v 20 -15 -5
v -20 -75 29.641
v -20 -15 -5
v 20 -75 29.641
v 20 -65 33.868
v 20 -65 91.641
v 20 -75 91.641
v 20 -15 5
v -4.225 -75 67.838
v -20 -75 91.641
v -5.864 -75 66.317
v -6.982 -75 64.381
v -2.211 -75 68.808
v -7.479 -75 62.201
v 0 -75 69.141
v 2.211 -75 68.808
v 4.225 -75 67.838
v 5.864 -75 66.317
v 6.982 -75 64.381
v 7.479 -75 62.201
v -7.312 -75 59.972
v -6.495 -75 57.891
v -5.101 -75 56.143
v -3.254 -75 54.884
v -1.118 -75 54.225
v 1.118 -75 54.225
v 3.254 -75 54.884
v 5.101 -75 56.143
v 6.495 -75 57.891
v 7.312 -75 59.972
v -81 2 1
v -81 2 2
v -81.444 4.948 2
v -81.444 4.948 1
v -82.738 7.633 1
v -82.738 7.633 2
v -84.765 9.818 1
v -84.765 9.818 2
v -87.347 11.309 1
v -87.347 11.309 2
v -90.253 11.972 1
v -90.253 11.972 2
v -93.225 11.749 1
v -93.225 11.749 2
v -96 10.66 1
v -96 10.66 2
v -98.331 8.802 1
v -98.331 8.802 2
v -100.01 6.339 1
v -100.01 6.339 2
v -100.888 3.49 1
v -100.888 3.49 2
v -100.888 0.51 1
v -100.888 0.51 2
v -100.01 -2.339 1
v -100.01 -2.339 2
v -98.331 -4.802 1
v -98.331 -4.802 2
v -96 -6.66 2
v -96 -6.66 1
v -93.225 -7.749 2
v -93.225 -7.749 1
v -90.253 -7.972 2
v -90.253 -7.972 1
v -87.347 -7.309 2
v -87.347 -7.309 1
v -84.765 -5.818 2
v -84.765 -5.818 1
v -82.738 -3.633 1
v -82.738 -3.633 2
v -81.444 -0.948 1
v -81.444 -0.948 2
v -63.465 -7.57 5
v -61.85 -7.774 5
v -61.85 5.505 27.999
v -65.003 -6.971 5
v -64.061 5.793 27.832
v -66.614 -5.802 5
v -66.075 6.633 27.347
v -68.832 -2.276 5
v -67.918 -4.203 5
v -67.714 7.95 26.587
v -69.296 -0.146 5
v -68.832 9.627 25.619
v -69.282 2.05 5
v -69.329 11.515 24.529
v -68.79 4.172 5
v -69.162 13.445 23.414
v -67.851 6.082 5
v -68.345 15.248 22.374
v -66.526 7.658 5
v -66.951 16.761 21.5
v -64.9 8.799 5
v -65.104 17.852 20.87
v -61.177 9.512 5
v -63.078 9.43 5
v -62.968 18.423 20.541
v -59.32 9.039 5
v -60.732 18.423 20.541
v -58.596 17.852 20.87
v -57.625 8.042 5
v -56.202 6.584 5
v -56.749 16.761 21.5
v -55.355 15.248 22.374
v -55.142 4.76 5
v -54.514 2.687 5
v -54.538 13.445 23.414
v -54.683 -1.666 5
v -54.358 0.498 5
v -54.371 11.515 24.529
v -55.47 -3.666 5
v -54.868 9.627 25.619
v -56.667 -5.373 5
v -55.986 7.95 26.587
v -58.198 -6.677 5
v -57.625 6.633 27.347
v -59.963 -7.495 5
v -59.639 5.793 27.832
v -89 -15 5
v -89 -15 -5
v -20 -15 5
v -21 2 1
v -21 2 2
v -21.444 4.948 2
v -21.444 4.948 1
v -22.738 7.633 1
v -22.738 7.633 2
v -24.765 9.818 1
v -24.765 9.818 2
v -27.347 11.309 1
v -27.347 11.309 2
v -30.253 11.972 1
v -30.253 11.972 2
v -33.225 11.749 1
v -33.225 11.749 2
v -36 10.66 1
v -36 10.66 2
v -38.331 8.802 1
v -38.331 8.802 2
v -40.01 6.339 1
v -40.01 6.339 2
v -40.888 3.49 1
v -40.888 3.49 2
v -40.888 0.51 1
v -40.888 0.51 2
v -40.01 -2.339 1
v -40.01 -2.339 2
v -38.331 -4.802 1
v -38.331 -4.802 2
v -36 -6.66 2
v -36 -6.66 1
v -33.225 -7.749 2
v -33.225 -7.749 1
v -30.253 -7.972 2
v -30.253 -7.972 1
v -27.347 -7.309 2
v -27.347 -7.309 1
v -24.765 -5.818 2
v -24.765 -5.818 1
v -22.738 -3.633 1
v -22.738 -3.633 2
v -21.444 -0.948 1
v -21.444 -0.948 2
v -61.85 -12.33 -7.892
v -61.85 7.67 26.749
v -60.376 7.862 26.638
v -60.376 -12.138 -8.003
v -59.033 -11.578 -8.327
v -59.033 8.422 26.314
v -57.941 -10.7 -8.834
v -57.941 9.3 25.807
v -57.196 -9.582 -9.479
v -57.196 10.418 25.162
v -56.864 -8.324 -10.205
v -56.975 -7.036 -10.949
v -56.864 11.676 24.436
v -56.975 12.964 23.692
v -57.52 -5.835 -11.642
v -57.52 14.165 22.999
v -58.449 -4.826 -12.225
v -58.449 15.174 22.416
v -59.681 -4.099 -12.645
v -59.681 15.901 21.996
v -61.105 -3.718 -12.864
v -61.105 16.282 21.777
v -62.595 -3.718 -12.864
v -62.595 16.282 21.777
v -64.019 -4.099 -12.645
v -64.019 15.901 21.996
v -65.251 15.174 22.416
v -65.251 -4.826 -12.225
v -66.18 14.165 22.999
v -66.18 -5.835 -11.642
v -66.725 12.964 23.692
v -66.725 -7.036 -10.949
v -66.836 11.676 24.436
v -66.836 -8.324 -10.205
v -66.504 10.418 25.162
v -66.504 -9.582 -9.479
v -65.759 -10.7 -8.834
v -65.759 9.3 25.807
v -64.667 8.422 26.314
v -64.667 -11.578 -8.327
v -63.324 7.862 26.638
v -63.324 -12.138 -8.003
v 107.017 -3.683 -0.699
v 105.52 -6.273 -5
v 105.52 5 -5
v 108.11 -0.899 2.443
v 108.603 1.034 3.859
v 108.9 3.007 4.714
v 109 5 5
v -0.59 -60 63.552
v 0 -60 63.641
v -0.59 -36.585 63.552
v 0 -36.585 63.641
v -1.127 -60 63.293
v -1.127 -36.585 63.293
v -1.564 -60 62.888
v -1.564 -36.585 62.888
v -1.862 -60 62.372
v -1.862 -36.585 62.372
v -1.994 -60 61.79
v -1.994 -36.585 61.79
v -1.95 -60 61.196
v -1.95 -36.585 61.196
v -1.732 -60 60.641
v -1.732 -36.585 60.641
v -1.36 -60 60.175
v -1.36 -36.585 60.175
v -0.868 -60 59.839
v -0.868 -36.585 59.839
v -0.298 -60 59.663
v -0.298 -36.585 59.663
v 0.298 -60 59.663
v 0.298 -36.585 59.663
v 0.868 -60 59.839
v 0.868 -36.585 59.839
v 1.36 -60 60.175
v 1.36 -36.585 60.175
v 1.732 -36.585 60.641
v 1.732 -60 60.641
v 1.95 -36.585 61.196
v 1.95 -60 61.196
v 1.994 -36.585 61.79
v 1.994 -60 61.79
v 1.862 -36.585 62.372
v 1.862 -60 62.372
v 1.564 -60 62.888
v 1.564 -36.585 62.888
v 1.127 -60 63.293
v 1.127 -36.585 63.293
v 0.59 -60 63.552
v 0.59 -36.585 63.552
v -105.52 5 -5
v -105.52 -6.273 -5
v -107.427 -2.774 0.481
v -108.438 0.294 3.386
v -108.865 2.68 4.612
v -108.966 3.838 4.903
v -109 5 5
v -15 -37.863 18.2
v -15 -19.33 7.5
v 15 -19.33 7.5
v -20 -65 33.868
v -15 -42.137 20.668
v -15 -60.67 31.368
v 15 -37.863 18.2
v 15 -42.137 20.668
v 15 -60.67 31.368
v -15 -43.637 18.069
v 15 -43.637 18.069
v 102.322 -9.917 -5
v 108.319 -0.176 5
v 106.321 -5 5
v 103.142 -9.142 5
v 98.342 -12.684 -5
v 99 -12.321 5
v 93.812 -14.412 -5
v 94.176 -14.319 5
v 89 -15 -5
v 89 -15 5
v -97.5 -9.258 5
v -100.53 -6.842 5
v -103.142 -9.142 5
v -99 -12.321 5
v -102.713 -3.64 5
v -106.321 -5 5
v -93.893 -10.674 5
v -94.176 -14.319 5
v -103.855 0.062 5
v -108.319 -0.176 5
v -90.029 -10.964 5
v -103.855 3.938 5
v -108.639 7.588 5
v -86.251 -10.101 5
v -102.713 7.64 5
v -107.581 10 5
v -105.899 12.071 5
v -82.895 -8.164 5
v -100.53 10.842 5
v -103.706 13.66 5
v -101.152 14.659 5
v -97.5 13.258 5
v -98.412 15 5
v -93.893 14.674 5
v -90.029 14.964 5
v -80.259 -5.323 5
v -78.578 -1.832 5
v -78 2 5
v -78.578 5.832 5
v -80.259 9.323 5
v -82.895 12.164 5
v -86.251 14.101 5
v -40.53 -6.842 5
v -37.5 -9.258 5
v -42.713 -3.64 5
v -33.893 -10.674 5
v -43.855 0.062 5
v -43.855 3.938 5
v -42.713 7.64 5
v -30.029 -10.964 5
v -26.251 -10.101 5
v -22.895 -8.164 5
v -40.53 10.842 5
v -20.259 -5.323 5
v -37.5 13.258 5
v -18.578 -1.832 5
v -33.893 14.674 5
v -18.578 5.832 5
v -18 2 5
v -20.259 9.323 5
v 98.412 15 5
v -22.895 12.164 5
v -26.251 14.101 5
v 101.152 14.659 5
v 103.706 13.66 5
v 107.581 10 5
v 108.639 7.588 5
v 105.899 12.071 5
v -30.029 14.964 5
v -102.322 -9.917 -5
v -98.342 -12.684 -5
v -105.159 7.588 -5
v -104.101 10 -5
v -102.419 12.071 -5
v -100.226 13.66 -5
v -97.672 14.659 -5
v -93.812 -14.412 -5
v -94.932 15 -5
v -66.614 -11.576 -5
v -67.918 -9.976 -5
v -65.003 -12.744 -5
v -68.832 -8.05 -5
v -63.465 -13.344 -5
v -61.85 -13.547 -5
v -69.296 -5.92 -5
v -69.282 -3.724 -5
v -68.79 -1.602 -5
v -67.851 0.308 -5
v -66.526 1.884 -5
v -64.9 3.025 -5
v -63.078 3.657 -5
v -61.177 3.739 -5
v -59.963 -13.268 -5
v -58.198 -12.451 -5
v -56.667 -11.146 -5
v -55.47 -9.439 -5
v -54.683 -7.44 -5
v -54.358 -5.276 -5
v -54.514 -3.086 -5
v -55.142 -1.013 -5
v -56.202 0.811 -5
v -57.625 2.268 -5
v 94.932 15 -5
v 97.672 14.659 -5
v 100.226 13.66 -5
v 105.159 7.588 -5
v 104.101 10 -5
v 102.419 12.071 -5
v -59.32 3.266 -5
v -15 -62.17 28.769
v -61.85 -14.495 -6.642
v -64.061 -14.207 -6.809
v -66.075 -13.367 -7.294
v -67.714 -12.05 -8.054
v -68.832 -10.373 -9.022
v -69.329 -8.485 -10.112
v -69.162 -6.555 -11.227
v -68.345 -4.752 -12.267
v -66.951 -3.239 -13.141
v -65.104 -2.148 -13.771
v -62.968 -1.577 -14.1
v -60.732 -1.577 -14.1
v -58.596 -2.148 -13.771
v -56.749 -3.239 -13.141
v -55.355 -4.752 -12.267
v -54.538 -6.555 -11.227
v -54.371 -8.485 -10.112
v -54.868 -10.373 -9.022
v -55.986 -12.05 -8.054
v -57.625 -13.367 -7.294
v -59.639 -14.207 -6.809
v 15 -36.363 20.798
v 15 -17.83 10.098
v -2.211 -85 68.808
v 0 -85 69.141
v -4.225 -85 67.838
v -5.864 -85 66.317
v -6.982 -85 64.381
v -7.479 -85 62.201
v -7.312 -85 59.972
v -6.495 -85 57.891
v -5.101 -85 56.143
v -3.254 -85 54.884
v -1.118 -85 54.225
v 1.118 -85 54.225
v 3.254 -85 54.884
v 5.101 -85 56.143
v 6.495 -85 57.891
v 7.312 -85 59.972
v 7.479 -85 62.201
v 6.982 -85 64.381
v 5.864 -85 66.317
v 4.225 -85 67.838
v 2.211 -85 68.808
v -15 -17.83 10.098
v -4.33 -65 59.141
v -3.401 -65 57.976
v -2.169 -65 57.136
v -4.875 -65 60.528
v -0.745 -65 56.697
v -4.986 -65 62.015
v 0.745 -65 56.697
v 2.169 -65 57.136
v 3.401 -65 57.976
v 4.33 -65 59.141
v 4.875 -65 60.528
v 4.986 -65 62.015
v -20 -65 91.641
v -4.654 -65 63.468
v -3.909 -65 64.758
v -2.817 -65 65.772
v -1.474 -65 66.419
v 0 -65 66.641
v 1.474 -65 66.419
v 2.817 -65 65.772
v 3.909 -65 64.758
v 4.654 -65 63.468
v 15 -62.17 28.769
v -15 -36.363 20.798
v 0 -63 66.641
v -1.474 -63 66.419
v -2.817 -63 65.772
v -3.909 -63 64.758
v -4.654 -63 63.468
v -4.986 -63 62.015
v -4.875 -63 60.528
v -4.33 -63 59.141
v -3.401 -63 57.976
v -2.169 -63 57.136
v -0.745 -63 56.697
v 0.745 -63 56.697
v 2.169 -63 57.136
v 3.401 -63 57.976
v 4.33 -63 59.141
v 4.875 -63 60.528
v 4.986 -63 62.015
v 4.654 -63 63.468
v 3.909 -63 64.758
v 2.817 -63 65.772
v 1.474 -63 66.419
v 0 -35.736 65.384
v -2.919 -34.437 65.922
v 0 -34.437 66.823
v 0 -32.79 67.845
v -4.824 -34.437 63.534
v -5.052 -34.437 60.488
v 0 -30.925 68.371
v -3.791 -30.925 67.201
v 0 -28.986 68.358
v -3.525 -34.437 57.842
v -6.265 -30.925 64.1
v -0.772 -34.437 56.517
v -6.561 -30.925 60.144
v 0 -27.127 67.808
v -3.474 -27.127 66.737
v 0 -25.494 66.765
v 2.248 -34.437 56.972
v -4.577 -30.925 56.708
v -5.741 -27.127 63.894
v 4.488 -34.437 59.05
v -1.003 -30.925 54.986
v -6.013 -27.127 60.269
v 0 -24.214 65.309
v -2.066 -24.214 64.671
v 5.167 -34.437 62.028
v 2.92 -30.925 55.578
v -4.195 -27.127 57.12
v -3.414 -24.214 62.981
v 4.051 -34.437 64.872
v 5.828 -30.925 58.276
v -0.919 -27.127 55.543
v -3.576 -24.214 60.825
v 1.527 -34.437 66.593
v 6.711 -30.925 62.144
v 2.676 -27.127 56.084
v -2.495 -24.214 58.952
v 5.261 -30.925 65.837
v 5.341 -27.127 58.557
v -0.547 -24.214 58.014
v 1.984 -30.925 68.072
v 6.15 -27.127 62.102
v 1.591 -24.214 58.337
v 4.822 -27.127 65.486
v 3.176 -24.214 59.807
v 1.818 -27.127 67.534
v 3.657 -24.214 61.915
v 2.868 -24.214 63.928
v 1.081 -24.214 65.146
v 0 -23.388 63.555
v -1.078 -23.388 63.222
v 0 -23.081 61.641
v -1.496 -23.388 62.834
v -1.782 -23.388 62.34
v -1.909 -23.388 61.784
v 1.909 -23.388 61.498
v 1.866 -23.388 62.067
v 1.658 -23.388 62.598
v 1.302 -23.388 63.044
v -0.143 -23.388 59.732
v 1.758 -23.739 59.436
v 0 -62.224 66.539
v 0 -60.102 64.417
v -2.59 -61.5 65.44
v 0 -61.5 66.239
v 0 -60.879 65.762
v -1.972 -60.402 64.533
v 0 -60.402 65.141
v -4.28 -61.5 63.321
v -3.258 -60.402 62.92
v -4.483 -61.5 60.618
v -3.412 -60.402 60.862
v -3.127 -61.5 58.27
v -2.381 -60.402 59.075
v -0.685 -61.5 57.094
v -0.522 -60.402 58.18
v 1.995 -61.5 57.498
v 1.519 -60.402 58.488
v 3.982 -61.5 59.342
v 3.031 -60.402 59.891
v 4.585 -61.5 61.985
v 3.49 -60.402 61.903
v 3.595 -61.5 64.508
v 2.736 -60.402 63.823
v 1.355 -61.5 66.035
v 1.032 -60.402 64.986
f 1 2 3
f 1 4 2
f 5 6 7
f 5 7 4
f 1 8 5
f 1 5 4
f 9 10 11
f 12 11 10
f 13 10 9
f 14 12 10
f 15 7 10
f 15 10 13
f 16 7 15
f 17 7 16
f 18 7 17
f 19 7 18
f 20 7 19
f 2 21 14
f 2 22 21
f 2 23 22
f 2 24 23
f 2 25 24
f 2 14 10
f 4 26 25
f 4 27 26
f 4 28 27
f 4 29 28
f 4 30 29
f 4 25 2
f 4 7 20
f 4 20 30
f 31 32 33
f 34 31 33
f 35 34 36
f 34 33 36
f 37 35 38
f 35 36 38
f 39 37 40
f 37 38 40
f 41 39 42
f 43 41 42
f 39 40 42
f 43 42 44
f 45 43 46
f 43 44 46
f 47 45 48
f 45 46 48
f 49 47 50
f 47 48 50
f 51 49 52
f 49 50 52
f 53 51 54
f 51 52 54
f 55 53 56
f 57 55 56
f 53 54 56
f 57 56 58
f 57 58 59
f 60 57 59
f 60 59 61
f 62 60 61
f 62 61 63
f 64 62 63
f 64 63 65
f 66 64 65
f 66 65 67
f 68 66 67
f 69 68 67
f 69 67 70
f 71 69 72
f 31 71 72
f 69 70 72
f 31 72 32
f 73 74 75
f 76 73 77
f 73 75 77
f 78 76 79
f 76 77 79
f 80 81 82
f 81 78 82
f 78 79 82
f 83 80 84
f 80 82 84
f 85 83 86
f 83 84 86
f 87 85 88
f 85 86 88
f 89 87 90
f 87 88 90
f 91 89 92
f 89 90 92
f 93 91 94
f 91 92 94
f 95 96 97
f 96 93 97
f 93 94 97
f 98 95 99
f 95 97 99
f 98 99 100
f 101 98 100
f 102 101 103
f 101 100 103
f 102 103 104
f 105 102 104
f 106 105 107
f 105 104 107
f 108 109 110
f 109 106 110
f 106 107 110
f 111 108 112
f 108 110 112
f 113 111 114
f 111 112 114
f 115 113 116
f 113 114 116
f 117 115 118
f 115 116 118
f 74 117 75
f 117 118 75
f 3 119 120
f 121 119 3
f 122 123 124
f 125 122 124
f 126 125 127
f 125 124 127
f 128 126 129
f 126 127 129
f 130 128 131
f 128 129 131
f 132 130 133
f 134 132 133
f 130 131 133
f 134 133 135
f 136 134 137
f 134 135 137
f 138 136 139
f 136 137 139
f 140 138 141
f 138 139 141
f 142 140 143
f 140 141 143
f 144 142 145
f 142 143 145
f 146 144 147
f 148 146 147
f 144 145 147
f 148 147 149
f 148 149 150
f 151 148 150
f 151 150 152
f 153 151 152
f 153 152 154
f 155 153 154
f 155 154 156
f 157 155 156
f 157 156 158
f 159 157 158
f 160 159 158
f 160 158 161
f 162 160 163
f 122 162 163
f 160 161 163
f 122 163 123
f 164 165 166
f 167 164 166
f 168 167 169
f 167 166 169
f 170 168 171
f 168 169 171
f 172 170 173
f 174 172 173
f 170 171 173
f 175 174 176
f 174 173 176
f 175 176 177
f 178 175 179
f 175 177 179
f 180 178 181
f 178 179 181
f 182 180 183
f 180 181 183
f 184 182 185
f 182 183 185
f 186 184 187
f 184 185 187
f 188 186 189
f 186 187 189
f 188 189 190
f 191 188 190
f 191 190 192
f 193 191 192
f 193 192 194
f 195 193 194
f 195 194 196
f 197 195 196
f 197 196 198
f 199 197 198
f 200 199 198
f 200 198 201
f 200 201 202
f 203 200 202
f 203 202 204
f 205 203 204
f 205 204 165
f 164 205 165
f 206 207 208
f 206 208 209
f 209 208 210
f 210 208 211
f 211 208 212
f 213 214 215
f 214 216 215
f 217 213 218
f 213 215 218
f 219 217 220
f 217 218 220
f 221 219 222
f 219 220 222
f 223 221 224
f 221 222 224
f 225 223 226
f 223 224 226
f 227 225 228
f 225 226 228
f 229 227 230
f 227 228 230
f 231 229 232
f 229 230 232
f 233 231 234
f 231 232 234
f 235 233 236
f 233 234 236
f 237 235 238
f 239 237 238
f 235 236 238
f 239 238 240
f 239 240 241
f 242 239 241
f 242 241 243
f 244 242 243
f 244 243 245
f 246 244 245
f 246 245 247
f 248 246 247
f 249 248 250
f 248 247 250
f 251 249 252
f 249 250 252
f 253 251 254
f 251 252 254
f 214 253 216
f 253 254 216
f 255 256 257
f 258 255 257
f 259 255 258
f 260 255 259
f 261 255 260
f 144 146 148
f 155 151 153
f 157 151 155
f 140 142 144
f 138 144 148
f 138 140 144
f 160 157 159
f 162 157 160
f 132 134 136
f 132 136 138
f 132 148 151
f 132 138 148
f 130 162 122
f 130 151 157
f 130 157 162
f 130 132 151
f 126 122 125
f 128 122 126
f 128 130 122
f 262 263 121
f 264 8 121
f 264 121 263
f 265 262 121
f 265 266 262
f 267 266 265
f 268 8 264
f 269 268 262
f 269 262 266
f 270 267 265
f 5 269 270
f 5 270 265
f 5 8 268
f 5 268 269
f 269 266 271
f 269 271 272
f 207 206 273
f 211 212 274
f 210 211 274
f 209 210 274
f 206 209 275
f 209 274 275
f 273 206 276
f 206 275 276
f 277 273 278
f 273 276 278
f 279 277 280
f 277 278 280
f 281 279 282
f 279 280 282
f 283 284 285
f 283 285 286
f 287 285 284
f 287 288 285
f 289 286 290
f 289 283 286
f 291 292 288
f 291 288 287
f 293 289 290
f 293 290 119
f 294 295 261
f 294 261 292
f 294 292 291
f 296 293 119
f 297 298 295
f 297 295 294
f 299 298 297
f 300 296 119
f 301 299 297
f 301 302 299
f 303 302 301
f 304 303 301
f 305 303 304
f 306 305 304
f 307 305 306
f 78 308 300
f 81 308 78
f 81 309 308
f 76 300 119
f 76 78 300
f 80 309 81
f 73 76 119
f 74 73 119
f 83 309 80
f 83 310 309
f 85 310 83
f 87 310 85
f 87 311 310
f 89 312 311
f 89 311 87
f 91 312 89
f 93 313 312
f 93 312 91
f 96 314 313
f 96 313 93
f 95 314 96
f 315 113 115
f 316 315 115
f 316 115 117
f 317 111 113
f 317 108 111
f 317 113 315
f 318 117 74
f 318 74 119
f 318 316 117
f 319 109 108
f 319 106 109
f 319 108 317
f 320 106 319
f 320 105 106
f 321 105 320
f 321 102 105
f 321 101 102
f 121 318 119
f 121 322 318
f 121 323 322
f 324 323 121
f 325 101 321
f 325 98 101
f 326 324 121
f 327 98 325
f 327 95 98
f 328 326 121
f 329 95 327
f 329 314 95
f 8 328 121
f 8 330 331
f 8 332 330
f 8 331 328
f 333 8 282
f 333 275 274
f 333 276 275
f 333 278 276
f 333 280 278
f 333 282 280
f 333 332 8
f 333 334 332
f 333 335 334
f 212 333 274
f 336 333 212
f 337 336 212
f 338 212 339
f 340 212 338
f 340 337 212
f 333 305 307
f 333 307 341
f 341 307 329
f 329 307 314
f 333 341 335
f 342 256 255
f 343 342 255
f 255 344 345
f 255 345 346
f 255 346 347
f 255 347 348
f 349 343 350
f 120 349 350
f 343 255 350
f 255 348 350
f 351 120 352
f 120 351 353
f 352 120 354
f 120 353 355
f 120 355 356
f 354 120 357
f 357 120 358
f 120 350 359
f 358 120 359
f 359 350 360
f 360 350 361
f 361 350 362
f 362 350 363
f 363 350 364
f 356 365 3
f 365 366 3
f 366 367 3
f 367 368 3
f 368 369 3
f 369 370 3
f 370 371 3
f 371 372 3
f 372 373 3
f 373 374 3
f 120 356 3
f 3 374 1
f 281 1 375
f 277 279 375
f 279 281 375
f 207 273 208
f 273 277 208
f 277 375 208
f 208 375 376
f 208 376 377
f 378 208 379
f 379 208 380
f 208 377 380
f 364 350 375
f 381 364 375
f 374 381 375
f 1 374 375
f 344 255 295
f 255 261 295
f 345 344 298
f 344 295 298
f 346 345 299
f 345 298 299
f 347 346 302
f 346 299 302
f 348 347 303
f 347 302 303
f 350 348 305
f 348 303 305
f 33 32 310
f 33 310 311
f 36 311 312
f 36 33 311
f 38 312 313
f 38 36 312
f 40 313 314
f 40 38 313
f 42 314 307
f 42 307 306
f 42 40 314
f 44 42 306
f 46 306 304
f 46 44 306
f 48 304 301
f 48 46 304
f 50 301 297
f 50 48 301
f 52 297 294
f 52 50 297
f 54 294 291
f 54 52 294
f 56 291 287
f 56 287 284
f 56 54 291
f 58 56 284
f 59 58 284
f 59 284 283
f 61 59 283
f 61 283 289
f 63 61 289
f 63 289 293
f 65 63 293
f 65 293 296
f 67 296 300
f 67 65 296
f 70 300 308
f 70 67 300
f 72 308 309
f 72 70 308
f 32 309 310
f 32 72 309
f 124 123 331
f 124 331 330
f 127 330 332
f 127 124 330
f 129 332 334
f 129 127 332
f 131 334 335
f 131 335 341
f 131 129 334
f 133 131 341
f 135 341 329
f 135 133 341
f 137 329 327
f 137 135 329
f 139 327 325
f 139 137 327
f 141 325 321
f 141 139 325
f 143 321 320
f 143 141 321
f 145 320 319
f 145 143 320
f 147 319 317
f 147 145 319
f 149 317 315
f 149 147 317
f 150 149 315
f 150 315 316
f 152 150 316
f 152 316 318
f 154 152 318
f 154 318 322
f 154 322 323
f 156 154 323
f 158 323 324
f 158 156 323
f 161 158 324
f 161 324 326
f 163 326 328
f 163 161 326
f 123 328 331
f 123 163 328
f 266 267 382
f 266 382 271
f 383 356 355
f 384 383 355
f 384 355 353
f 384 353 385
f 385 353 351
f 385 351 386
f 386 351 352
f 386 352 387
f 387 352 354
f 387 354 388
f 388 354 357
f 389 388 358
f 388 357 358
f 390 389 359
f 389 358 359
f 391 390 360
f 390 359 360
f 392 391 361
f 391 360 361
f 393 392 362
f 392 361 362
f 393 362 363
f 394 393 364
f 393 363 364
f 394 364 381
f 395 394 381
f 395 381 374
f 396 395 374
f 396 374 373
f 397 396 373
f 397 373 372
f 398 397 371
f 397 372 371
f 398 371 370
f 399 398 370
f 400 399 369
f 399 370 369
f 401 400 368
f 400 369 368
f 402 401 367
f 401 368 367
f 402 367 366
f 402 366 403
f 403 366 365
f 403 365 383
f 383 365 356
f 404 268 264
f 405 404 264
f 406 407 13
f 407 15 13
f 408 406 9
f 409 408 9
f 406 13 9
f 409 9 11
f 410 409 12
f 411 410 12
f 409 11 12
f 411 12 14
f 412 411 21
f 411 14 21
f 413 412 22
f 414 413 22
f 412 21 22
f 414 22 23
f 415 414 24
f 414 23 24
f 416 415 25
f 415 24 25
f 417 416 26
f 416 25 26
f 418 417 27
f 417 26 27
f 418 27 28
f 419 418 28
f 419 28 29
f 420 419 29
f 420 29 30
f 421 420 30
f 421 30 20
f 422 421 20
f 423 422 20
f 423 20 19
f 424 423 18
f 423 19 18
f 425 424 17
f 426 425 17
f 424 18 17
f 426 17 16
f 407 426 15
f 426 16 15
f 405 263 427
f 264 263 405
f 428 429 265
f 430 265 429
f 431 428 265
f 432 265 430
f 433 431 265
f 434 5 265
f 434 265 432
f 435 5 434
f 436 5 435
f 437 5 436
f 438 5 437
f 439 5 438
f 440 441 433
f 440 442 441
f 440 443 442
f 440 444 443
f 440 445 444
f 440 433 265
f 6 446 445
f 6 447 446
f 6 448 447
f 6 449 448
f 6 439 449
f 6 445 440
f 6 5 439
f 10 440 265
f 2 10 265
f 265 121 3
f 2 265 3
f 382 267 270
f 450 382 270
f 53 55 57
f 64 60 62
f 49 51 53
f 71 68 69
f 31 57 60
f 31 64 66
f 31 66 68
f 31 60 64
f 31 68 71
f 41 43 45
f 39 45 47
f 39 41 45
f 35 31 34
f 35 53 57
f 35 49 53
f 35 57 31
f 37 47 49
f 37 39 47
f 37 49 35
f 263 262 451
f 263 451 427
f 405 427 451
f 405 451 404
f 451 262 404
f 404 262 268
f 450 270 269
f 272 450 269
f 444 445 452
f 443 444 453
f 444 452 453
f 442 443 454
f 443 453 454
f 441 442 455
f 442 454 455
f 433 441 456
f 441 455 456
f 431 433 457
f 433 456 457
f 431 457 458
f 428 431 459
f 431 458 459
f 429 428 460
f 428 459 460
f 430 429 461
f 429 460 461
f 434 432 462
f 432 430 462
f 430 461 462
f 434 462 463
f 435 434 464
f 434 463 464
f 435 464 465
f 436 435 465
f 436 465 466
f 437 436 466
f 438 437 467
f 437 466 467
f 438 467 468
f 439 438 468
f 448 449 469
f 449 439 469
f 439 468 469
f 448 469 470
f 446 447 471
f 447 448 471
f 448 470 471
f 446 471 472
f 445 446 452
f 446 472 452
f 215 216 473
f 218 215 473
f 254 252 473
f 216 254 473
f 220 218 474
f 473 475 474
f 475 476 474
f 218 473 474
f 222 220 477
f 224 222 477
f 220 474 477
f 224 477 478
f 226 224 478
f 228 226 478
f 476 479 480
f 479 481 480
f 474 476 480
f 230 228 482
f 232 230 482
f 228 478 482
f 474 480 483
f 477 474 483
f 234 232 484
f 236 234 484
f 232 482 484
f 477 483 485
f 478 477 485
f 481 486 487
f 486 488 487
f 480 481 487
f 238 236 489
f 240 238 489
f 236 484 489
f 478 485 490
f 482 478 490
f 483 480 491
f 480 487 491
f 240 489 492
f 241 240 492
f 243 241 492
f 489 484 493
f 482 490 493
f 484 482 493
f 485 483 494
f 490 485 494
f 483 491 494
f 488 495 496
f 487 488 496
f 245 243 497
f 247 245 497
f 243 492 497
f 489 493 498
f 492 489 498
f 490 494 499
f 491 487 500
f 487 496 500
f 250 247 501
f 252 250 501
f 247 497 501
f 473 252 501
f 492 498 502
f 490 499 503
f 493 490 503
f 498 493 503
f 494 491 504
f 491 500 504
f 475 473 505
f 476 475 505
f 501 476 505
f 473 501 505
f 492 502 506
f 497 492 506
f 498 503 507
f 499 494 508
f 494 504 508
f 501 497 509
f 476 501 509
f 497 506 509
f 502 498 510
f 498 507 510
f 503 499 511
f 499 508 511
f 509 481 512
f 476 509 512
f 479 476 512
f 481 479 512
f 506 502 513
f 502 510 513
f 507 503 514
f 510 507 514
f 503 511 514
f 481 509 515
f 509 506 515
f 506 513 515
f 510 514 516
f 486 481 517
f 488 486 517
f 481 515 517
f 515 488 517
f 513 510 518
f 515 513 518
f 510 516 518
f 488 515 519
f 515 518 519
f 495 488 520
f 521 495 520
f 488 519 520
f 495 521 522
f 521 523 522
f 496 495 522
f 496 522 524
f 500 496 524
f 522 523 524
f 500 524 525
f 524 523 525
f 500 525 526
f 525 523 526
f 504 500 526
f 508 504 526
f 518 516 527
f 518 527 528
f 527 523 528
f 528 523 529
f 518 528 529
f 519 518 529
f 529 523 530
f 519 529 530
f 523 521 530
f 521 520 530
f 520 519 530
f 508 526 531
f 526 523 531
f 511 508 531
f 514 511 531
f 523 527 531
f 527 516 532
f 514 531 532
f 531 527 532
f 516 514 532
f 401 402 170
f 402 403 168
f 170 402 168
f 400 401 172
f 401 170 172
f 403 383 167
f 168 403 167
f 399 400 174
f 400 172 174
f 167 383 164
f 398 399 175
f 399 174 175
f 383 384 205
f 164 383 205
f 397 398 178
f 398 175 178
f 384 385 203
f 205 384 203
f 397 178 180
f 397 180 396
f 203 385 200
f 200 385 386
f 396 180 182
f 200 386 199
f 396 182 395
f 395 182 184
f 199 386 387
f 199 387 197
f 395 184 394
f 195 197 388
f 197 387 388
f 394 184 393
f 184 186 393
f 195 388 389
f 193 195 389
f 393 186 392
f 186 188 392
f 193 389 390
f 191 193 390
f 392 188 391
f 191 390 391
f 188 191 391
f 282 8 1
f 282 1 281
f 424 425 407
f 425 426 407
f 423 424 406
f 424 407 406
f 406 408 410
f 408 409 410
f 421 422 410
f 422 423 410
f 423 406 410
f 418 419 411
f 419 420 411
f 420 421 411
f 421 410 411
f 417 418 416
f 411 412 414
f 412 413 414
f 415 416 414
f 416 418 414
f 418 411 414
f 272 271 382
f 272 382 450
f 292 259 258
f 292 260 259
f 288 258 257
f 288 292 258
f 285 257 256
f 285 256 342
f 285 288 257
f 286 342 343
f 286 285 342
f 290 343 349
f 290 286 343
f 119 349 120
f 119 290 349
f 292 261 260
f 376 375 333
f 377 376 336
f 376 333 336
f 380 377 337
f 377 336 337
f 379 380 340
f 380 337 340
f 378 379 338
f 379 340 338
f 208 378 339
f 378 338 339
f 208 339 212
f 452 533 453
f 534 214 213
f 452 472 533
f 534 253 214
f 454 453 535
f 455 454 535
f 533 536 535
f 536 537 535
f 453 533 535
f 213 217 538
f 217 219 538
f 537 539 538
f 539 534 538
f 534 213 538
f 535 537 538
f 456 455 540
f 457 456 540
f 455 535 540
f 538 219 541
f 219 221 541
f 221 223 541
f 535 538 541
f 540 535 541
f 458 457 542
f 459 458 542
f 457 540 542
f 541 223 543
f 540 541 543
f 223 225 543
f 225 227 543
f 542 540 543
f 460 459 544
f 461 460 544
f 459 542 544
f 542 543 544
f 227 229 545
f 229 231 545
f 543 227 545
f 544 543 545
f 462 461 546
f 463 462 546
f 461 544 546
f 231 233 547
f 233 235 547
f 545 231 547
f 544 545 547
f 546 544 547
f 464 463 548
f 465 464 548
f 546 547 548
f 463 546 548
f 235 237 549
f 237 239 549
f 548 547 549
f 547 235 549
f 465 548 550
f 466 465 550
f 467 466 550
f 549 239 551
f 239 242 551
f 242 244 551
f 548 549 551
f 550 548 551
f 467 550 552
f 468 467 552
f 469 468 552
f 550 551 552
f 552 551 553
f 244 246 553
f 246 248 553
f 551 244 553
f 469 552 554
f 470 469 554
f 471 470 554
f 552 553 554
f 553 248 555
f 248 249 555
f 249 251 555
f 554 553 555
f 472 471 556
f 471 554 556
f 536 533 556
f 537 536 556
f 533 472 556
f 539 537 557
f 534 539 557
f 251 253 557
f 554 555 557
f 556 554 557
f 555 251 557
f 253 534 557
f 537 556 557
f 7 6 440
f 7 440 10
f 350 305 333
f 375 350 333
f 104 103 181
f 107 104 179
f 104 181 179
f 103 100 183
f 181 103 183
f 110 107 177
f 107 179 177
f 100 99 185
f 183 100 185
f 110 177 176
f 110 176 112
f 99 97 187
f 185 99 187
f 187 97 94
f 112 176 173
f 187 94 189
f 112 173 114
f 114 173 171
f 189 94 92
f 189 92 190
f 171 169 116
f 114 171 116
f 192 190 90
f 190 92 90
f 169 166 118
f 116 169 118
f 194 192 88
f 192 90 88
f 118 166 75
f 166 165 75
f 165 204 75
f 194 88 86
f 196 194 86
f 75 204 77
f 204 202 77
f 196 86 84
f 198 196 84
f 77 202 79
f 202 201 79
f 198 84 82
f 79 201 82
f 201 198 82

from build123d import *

# Parameters (mm, degrees)
SKETCH2_W            = 218
SKETCH2_H            = 30
BOSS_EXTRUDE1_DEPTH  = 5
FILLET1_R            = 20
SKETCH3_R            = 10
CUT_EXTRUDE1_DEPTH   = 4
SKETCH3_3_R          = 10
CUT_EXTRUDE2_DEPTH   = 4
CHAMFER1_SIZE        = 3
SKETCH6_R            = 5
CUT_EXTRUDE3_DEPTH   = 119.749210232
BOSS_EXTRUDE2_DEPTH  = 20
SKETCH8_W            = 30
SKETCH8_H            = 21.4
BOSS_EXTRUDE3_DEPTH  = 3
SKETCH10_W           = 30
SKETCH10_H           = 21.4
CUT_EXTRUDE4_DEPTH   = 3
CUT_EXTRUDE5_DEPTH   = 40
FILLET2_R            = 10
FILLET2_OF_MIRROR1_R = 10


with BuildPart() as part:
    # Sketch2 → Boss-Extrude1 (new, symmetric)
    with BuildSketch(Plane.XY):
        Rectangle(SKETCH2_W, SKETCH2_H)
    extrude(amount=BOSS_EXTRUDE1_DEPTH, both=True)

    # Fillet1
    fillet1_edges = [part.edges().sort_by_distance(p)[0] for p in [
        (109, -15, 0),
        (-109, -15, 0),
    ]]
    fillet(fillet1_edges, radius=FILLET1_R)

    # Sketch3 → Cut-Extrude1 (cut)
    with BuildSketch(Plane.XY.offset(5)):
        with Locations((-91, 2)):
            Circle(SKETCH3_R)
    extrude(amount=-CUT_EXTRUDE1_DEPTH, mode=Mode.SUBTRACT)

    # Sketch3<3> → Cut-Extrude2 (cut)
    with BuildSketch(Plane.XY.offset(5)):
        with Locations((-91, 2)):
            Circle(SKETCH3_3_R)
        with Locations((-31, 2)):
            Circle(SKETCH3_3_R)
    extrude(amount=-CUT_EXTRUDE2_DEPTH, mode=Mode.SUBTRACT)

    # Chamfer1
    chamfer1_edges = [part.edges().sort_by_distance(p)[0] for p in [
        (-101, 2, 5),
        (-41, 2, 5),
    ]]
    chamfer(chamfer1_edges, length=CHAMFER1_SIZE - 0.0001)  # a hair under: the kernel refuses the full size

    # Sketch5 → Revolve1 (revolve)
    with BuildSketch(Plane(origin=(-61.85, 0, 0), x_dir=(0, 0, -1), z_dir=(1, 0, 0)), mode=Mode.PRIVATE) as revolve1_sk:
        Polygon((-20.498711306, 18.495190528), (-24.248711306, 12), (10.392304845, -8), (14.142304845, -1.504809472), align=None)
    revolve(revolve1_sk.sketch.rotate(Axis((-61.85, 12, 24.248711306), (0, -0.49999999999999767, -0.86602540378444)), 180), axis=Axis((-61.85, 12, 24.248711306), (0, -0.49999999999999767, -0.86602540378444)))

    # Sketch6 → Cut-Extrude3 (cut, through all)
    with BuildSketch(Plane(origin=(0, 13.5, 23.382685902), x_dir=(1, 0, 0), z_dir=(0, 0.4999999999999978, 0.86602540378444))):
        with Locations(Location((-61.85, -1.732050808, 0), (0, 0, 270))):
            Circle(SKETCH6_R)
    extrude(amount=-CUT_EXTRUDE3_DEPTH, mode=Mode.SUBTRACT)

    # Sketch7 → Boss-Extrude2 (add, symmetric)
    with BuildSketch(Plane(origin=(0, 0, 0), x_dir=(0, 0, -1), z_dir=(1, 0, 0))):
        Polygon((5, -15), (-5, -15), (-33.867513459, -65), (-91.641016151, -65), (-91.641016151, -75), (-29.641016151, -75), align=None)
    extrude(amount=BOSS_EXTRUDE2_DEPTH, both=True)

    # Sketch8 → Boss-Extrude3 (add)
    with BuildSketch(Plane(origin=(0, -1.584936491, -2.745190528), x_dir=(1, 0, 0), z_dir=(0, 0.4999999999999978, 0.86602540378444))):
        with Locations((0, -31.190381057)):
            Rectangle(SKETCH8_W, SKETCH8_H)
    extrude(amount=BOSS_EXTRUDE3_DEPTH)

    # Sketch10 → Cut-Extrude4 (cut)
    with BuildSketch(Plane(origin=(0, -1.584936491, -2.745190528), x_dir=(1, 0, 0), z_dir=(0, 0.499999999999998, 0.8660254037844398))):
        with Locations((0, -57.525407976)):
            Rectangle(SKETCH10_W, SKETCH10_H)
    extrude(amount=-CUT_EXTRUDE4_DEPTH, mode=Mode.SUBTRACT)

    # Sketch11 → Revolve2 (revolve)
    with BuildSketch(Plane(origin=(0, 0, 0), x_dir=(0, 0, -1), z_dir=(1, 0, 0)), mode=Mode.PRIVATE) as revolve2_sk:
        with BuildLine():
            Line((-61.641016151, -23.08118878), (-61.641016151, -85))
            Line((-61.641016151, -85), (-54.141016151, -85))
            Line((-54.141016151, -85), (-54.141016151, -75))
            Line((-54.141016151, -75), (-56.641016151, -75))
            Line((-56.641016151, -75), (-56.641016151, -63))
            ThreePointArc((-56.641016151, -63), (-57.519695808, -60.878679656), (-59.641016151, -60))
            Line((-59.641016151, -60), (-59.641016151, -36.58459552))
            ThreePointArc((-59.641016151, -36.58459552), (-54.92395374, -28.986133621), (-61.641016151, -23.08118878))
        make_face()
    revolve(revolve2_sk.sketch.rotate(Axis((0, -23.08118878, 61.641016151), (0, -1, 0)), 180), axis=Axis((0, -23.08118878, 61.641016151), (0, -1, 0)))

    # Sketch12 → Cut-Extrude5 (cut)
    with BuildSketch(Plane(origin=(0, 15, 0), x_dir=(1, 0, 0), z_dir=(0, 1, 0))):
        Polygon((-109, -5), (-109, 5), (-105.52, 5), align=None)
    cut_extrude5 = extrude(amount=-CUT_EXTRUDE5_DEPTH, mode=Mode.SUBTRACT)

    # Fillet2
    fillet2_edges = [part.edges().sort_by_distance(p)[0] for p in [
        (-107.26, 15, 0),
    ]]
    fillet(fillet2_edges, radius=FILLET2_R)

    # Mirror1: Cut-Extrude5 across plane
    add(cut_extrude5.mirror(Plane(origin=(0, 0, 0), x_dir=(0, 0, 1), z_dir=(1, 0, 0))), mode=Mode.SUBTRACT)

    # Fillet2 of Mirror1
    fillet2_of_mirror1_edges = [part.edges().sort_by_distance(p)[0] for p in [
        (107.26, 15, 0),
    ]]
    fillet(fillet2_of_mirror1_edges, radius=FILLET2_OF_MIRROR1_R)


solid = part.part
